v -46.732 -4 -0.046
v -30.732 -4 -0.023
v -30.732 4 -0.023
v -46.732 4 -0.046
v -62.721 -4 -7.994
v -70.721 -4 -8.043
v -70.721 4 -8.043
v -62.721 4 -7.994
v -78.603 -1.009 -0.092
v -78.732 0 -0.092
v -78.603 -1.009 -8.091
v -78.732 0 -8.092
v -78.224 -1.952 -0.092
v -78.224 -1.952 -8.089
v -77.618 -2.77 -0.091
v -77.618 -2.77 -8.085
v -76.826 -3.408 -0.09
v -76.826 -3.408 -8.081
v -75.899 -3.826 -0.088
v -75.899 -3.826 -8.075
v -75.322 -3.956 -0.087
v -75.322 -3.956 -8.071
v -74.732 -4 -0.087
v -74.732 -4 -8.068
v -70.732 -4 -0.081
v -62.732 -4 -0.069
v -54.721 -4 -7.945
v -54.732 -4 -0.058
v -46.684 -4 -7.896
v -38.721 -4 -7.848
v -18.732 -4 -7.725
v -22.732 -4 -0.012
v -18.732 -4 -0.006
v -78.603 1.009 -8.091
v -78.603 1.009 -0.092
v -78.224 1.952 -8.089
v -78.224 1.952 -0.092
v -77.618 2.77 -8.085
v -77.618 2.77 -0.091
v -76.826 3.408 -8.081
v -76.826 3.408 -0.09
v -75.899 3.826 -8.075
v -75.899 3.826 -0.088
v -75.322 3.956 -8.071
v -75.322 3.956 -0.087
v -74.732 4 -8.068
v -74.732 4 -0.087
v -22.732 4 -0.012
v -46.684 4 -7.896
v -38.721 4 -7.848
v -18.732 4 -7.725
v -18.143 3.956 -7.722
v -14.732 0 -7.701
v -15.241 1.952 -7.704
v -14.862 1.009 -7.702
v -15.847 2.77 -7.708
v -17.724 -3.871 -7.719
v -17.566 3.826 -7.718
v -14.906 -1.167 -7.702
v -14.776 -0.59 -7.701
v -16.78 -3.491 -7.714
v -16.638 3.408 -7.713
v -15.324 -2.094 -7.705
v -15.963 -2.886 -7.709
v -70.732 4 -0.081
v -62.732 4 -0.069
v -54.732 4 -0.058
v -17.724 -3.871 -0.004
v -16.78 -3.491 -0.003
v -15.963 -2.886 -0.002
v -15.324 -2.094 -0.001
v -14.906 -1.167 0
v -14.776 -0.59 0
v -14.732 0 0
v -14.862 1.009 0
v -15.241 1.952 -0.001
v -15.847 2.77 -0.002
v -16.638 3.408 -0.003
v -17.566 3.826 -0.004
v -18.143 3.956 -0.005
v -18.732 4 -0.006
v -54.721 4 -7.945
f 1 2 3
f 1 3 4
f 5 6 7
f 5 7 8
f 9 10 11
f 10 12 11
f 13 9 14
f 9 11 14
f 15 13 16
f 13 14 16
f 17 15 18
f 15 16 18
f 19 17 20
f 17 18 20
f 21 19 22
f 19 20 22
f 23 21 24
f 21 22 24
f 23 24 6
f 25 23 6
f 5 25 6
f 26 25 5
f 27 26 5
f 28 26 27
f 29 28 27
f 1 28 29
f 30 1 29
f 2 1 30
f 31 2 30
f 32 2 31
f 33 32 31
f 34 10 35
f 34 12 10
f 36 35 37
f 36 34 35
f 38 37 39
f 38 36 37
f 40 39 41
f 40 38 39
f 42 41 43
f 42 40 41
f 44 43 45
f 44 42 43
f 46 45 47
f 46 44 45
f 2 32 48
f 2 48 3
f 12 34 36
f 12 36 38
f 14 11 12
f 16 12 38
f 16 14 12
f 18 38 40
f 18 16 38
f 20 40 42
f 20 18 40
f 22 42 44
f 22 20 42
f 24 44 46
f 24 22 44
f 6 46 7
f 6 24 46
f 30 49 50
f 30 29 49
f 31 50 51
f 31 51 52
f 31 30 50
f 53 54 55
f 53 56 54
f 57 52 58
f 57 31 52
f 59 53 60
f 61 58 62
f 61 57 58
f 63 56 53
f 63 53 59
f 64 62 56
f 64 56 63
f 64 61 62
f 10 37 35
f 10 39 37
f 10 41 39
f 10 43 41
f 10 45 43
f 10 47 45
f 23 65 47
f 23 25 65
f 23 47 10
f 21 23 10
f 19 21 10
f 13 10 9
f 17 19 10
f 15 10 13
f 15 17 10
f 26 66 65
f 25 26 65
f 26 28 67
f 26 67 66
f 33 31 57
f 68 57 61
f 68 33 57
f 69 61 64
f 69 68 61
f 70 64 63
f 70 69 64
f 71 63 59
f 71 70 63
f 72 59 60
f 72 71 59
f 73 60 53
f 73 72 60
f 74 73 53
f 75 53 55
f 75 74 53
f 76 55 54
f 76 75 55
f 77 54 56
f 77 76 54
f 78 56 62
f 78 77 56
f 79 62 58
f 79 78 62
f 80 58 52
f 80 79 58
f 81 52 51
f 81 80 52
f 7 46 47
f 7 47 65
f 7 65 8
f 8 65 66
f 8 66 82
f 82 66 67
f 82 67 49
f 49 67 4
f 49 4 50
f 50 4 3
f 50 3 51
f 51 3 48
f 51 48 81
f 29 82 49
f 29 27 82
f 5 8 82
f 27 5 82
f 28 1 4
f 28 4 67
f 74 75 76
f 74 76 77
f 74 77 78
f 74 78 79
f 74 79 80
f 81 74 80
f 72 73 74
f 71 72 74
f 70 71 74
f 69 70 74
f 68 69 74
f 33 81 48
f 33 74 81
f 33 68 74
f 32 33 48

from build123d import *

# Parameters (mm, degrees)
F1_DEPTH = 4
F2_R     = 3.99999


# Not quite as in the source:
# - a fillet or chamfer is up to 0.001 mm smaller than in the source, because OpenCascade refuses the exact size
# - ends of sketch curves that miss each other by under 0.0002 mm in the source are joined
# - a feature names something its author has since deleted; it is built from what else it names


with BuildPart() as f1:
    # F0 (on Front) → F1 (new body, symmetric)
    with BuildSketch(Plane.XZ):
        Polygon((-14.732436277, -7.7009890229), (-14.732436277, 0), (-22.7324279615, -0.0115346295), (-22.721270651, -7.7498318101), align=None)
        Polygon((-22.721270651, -7.7498318101), (-22.7324279615, -0.0115346295), (-30.732419646, -0.0230692591), (-30.7212084456, -7.7987424823), align=None)
        Polygon((-30.7212084456, -7.7987424823), (-30.732419646, -0.0230692591), (-38.7324113305, -0.0346038886), (-38.7211462402, -7.8476531545), align=None)
        Polygon((-38.7211462402, -7.8476531545), (-38.7324113305, -0.0346038886), (-46.732403015, -0.0461385181), (-46.6844078154, -7.8963395926), align=None)
        Polygon((-46.6844078154, -7.8963395926), (-46.732403015, -0.0461385181), (-54.7323946996, -0.0576731477), (-54.7210218294, -7.9454744989), align=None)
        Polygon((-54.7210218294, -7.9454744989), (-54.7323946996, -0.0576731477), (-62.7323863841, -0.0692077772), (-62.7208598391, -7.994384561), align=None)
        Polygon((-62.7208598391, -7.994384561), (-62.7322865984, -0.0692076333), (-70.7323780686, -0.0807424068), (-70.7208974186, -8.0432958433), align=None)
        Polygon((-70.7208974186, -8.0432958433), (-70.7323780686, -0.0807424068), (-78.7323697531, -0.0922770363), (-78.7323697531, -8.0922770363), align=None)
    extrude(amount=F1_DEPTH, both=True)

    # F2 (radius 4 in the source; OpenCascade refuses exactly that, so slightly less here)
    f2_edges = [f1.edges().sort_by_distance(p)[0] for p in [
        (-78.73237, 4, -4.092277),
        (-78.73237, -4, -4.092277),
        (-14.732436, 4, -3.850495),
        (-14.732436, -4, -3.850495),
    ]]
    fillet(f2_edges, radius=F2_R)


solid = f1.part
